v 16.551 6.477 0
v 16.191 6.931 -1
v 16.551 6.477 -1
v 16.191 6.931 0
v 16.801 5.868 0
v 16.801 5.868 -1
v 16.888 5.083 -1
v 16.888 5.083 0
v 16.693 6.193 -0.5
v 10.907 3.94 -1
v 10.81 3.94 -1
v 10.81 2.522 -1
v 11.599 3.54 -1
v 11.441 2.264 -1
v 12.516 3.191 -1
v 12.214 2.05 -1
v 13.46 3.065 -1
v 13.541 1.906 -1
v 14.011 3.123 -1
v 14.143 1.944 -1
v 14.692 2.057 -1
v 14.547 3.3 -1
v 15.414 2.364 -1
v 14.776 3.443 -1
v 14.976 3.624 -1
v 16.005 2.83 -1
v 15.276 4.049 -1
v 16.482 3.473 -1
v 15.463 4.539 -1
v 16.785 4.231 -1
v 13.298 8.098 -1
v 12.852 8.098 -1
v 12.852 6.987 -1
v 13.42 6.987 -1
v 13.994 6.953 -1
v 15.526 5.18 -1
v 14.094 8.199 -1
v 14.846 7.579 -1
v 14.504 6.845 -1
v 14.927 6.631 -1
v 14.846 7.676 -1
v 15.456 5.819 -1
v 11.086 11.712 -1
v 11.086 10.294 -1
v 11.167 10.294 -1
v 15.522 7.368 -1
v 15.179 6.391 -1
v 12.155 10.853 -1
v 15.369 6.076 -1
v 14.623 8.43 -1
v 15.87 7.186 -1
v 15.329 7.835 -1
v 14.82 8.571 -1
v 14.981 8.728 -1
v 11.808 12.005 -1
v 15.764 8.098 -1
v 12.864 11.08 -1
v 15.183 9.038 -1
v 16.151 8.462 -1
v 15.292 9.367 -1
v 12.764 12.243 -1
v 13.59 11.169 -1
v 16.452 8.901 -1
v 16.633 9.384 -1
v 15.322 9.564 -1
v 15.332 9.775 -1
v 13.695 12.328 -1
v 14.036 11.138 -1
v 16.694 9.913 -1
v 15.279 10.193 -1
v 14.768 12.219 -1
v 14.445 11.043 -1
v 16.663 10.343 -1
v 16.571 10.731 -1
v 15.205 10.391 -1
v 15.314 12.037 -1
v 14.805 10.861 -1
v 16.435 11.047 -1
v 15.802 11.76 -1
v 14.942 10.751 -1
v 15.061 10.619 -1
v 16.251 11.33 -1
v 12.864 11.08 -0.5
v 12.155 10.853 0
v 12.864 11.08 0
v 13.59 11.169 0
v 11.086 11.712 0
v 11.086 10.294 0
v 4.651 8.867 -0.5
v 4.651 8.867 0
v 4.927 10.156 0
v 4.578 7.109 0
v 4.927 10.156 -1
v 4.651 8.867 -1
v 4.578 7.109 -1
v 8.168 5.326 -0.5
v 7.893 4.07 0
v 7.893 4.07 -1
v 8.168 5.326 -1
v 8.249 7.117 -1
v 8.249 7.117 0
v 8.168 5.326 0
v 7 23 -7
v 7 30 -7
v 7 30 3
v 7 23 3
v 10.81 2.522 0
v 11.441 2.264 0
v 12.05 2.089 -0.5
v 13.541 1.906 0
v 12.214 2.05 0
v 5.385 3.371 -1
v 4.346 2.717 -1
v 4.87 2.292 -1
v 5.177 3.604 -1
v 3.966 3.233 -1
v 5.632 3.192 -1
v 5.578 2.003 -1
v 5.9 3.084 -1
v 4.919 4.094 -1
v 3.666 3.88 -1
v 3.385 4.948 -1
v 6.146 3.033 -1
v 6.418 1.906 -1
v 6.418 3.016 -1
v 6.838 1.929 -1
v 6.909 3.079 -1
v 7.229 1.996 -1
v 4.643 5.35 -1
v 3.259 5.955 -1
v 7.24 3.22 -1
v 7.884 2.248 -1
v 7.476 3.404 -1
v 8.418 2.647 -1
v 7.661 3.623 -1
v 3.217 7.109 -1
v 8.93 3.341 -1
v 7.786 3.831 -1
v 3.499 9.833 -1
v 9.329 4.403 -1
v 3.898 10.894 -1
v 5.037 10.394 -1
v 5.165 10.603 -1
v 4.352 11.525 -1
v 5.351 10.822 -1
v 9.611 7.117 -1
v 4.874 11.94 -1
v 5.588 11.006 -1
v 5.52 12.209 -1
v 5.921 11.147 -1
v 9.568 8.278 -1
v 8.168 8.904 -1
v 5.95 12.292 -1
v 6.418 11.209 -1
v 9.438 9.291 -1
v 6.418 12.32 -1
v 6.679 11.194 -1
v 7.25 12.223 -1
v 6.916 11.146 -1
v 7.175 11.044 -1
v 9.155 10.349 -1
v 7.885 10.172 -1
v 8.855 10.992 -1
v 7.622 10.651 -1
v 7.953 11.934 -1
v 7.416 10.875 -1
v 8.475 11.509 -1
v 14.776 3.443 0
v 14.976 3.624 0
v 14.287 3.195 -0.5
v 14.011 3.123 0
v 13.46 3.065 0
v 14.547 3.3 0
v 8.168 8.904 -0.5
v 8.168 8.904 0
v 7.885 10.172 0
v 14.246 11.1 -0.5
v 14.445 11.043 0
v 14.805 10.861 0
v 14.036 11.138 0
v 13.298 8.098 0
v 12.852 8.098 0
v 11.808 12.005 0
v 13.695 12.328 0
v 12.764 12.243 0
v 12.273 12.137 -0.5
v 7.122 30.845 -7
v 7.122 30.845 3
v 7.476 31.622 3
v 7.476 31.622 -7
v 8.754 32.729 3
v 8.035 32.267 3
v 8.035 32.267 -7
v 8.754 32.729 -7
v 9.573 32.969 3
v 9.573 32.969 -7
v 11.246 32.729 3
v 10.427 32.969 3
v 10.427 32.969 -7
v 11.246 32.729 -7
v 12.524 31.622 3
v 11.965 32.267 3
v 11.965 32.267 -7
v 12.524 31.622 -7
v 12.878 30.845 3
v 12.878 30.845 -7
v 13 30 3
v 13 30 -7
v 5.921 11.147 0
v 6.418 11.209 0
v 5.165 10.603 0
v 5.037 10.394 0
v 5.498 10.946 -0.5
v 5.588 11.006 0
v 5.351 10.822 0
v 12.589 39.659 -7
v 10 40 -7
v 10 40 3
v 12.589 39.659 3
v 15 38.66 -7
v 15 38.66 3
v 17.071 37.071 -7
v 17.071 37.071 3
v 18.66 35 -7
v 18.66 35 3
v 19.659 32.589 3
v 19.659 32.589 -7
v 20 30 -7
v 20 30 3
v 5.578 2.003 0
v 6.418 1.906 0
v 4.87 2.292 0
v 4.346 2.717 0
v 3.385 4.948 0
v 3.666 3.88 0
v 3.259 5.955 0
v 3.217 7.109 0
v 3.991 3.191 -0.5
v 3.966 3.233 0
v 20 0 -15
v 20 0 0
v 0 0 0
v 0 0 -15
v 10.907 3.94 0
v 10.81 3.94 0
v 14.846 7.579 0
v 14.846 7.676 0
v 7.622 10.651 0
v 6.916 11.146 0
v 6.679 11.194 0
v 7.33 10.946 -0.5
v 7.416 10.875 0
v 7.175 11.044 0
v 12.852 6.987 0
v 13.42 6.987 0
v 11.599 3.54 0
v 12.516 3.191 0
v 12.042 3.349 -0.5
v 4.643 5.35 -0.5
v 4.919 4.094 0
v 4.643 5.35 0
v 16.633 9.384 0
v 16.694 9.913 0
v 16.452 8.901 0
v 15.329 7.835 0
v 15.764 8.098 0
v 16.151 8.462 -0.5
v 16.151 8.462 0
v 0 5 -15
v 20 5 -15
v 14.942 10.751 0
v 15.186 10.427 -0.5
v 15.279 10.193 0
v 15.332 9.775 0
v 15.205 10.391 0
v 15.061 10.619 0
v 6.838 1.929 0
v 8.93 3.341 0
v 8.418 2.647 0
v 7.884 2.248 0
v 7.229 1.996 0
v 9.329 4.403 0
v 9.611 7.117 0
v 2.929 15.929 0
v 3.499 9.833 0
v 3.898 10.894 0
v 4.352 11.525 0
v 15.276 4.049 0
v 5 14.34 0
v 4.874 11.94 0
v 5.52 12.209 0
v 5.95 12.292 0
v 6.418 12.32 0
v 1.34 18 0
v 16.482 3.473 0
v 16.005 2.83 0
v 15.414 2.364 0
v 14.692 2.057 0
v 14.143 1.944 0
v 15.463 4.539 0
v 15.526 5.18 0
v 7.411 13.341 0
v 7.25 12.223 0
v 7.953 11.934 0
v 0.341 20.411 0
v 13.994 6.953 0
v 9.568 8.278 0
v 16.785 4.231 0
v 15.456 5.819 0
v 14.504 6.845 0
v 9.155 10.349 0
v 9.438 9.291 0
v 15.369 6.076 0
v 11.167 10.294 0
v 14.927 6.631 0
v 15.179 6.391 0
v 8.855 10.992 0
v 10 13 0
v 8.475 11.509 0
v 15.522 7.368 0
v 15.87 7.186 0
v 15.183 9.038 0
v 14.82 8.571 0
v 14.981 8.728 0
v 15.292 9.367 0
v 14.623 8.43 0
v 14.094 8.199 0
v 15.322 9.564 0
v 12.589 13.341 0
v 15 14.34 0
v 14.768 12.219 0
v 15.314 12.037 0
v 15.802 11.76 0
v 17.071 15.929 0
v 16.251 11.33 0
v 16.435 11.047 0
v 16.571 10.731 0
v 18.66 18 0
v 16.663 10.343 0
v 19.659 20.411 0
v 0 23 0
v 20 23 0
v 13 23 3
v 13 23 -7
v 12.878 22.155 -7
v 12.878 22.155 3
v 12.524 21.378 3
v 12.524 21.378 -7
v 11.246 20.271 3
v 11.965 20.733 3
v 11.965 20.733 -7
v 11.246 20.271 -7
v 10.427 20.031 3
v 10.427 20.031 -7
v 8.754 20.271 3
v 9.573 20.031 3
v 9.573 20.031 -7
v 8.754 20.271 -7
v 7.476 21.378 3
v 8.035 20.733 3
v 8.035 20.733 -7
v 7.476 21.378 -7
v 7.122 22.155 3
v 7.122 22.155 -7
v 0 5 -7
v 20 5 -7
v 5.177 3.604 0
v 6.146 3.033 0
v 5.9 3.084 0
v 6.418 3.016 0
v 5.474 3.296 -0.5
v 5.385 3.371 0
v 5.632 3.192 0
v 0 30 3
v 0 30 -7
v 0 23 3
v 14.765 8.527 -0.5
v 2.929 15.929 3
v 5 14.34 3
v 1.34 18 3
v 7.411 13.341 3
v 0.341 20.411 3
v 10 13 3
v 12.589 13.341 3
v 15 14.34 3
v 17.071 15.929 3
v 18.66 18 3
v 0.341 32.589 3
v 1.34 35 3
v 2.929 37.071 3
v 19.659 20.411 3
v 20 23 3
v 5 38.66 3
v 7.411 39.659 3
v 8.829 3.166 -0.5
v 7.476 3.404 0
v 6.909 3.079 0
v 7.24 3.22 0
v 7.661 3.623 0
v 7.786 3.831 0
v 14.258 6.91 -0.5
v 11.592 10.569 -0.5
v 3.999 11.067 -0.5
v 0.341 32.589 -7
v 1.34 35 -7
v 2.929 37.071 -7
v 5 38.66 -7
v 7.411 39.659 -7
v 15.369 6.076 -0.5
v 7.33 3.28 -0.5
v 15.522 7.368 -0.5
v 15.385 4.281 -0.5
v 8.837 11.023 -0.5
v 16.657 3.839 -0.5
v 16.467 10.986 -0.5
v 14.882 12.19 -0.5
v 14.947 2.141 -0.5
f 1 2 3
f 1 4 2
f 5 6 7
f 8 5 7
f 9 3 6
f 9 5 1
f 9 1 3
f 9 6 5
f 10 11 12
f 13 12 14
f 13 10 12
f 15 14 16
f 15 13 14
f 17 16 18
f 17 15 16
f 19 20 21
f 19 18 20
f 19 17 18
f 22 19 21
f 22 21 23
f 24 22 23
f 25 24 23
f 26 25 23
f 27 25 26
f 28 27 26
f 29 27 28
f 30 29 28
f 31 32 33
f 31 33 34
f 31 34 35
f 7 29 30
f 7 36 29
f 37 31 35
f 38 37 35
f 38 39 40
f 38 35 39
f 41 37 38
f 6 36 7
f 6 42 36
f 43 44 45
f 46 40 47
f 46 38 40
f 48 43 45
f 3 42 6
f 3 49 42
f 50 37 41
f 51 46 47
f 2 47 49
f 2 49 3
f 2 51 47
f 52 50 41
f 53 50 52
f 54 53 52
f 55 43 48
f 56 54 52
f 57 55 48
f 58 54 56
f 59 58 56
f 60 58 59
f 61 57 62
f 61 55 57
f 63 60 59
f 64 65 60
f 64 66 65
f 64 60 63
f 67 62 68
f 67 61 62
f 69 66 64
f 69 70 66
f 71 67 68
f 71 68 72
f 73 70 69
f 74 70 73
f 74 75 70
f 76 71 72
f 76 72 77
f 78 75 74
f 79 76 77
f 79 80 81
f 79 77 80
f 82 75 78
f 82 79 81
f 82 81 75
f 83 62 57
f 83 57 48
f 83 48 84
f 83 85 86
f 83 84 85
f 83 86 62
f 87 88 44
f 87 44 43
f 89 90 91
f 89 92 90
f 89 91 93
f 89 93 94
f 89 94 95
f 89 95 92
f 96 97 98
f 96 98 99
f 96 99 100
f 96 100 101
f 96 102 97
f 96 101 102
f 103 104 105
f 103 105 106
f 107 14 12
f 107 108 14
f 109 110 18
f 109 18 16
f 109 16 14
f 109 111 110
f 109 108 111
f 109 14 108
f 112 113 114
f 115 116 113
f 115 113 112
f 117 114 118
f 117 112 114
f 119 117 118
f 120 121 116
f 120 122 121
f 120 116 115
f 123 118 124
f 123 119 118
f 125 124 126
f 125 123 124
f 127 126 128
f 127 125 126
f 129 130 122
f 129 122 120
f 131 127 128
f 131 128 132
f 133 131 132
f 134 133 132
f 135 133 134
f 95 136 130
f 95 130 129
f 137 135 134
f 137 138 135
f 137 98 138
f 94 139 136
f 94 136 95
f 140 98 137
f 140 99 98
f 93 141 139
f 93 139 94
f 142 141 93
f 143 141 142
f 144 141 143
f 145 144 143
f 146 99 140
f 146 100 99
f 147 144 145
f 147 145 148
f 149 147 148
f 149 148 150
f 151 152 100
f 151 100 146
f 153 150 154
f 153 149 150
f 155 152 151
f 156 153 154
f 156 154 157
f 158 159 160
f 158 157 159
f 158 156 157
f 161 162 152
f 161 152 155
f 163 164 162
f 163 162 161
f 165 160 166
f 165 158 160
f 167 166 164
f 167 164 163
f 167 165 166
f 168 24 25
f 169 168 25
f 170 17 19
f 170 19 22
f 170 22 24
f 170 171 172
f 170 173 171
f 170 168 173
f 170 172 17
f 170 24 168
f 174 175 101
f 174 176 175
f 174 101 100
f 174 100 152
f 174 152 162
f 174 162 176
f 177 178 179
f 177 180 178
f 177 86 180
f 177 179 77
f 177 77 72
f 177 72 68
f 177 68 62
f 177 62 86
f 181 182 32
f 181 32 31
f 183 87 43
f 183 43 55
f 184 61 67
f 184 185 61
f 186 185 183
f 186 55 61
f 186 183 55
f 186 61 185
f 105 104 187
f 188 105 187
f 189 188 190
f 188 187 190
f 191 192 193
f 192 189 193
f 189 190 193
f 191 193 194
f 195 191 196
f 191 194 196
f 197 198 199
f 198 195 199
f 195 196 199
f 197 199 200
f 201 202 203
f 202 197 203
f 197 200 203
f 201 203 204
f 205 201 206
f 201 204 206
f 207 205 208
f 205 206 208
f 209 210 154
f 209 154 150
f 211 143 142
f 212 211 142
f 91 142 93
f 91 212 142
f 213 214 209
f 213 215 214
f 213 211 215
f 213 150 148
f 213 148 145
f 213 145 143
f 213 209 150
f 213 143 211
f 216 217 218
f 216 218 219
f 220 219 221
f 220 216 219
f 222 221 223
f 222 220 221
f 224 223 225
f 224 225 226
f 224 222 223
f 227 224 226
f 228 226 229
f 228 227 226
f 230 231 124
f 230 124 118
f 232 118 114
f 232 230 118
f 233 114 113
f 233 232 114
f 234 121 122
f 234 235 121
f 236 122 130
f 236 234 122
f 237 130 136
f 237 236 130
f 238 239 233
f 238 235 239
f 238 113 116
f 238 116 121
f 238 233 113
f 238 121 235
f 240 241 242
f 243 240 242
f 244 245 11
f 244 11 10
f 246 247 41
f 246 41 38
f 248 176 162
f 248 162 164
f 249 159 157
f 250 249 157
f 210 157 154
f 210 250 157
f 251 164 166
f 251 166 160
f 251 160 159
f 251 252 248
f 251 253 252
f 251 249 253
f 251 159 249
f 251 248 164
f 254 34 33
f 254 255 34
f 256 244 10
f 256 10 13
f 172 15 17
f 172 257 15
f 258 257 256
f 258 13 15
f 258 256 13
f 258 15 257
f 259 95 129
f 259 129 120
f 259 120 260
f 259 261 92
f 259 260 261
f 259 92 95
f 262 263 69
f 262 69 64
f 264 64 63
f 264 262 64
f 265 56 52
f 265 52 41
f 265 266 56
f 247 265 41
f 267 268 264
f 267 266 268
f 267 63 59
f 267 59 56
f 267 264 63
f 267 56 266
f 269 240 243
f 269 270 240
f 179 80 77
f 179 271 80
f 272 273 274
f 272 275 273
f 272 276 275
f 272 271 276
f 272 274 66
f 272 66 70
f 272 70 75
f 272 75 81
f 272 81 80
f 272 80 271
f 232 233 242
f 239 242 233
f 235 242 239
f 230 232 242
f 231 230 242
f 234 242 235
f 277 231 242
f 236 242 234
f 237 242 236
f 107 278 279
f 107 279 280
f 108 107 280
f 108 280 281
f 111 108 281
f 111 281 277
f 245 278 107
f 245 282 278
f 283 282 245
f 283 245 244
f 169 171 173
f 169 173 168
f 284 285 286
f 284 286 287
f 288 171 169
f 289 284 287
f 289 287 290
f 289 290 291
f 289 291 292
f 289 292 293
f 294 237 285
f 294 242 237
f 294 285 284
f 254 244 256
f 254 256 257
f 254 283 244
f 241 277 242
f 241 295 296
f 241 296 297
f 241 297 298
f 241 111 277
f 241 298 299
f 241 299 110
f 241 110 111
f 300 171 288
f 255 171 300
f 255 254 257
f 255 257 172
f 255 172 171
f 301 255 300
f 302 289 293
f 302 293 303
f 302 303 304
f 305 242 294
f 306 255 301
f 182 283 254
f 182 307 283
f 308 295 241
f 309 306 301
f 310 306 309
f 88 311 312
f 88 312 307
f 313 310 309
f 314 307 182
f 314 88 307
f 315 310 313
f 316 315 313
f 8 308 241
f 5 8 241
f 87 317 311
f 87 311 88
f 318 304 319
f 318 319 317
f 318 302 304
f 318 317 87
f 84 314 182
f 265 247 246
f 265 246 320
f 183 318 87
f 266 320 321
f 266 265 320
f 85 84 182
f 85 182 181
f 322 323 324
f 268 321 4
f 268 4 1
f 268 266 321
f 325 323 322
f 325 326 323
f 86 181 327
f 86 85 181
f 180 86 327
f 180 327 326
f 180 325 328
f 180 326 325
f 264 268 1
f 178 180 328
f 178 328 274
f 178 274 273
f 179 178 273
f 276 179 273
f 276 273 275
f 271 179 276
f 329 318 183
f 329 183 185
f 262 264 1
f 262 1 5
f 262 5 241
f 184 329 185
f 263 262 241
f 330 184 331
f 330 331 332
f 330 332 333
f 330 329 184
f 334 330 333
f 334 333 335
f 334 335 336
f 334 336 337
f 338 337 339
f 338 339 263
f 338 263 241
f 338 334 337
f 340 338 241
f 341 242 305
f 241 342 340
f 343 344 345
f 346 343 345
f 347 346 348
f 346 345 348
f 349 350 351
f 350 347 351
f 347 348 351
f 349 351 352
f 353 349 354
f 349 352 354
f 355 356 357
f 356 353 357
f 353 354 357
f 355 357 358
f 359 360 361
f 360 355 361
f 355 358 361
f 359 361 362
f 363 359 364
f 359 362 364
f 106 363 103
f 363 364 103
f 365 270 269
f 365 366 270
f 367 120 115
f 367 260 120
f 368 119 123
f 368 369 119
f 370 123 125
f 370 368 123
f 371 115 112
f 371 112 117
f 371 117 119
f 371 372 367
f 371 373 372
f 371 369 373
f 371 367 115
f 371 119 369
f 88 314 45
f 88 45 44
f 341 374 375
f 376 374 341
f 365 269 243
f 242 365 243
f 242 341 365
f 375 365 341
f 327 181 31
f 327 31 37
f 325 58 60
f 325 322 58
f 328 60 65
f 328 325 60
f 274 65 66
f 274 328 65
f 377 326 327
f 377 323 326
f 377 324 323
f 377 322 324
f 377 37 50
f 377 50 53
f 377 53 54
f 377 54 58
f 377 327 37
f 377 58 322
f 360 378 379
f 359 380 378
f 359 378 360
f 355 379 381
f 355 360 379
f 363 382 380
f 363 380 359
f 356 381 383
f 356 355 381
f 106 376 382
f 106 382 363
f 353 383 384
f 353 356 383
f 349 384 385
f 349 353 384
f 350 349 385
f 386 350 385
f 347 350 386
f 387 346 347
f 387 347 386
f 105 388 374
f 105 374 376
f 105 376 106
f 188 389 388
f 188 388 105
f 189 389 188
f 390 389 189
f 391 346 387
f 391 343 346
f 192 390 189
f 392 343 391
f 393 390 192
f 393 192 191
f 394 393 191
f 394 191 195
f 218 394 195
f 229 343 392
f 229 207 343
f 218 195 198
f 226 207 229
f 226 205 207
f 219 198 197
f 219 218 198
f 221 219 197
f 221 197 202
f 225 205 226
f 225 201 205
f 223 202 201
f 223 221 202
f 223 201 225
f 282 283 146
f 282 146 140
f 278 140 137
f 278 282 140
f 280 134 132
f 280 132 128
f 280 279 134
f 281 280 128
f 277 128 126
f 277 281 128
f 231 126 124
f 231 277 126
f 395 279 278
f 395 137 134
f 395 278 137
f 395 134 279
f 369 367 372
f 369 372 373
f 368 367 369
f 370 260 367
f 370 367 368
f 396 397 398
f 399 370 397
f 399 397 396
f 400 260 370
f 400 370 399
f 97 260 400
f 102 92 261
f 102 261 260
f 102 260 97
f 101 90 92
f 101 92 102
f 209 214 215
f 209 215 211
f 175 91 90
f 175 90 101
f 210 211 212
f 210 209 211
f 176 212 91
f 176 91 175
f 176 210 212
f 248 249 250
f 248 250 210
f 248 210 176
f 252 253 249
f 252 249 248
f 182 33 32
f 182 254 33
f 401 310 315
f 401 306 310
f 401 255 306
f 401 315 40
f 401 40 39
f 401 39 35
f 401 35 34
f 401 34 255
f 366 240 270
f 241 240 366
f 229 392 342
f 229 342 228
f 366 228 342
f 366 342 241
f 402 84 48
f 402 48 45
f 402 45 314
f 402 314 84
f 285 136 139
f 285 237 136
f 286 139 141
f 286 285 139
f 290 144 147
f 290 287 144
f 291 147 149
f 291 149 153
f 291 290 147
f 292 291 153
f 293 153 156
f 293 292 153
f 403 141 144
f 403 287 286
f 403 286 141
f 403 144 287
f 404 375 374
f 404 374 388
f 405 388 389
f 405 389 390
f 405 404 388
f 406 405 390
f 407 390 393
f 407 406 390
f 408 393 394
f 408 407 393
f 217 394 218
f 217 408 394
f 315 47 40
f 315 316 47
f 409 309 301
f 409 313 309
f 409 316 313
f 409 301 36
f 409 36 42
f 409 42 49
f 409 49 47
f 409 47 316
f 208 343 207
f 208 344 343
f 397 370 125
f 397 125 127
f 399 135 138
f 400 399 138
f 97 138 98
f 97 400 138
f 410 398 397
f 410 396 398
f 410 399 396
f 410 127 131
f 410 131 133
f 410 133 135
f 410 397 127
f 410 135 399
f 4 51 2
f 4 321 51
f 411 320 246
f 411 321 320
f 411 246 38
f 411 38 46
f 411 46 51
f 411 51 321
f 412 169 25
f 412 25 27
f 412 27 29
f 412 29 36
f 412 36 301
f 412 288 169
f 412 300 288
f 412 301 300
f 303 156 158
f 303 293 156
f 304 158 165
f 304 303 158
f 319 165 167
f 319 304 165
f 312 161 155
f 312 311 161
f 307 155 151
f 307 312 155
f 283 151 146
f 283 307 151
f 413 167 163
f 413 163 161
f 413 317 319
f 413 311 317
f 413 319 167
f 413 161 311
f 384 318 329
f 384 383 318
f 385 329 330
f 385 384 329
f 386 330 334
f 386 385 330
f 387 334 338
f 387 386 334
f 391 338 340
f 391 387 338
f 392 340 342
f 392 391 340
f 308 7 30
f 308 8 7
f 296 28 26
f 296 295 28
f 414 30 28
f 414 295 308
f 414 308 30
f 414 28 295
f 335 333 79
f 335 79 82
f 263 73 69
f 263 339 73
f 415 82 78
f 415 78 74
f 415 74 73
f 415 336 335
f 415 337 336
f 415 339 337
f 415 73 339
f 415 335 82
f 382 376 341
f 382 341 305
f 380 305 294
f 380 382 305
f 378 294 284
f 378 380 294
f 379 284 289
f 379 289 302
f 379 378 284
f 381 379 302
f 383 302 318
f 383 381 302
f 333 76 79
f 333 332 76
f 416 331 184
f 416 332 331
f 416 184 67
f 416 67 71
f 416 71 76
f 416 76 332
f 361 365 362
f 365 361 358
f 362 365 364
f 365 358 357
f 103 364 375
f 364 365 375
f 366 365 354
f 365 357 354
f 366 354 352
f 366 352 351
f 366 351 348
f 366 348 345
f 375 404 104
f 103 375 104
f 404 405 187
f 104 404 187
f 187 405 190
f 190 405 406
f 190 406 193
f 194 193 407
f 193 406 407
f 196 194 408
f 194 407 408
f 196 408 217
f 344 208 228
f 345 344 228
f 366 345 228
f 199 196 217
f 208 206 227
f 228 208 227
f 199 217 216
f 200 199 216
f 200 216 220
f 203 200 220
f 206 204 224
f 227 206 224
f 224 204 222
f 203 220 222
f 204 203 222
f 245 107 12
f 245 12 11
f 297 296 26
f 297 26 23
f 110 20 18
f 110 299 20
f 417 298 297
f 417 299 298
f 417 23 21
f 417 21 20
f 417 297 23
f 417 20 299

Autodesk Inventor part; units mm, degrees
ref_plane "YZ Plane" through (0, 0, 0) normal (1, 0, 0) x (0, 1, 0)
ref_plane "XZ Plane" through (0, 0, 0) normal (0, 1, 0) x (-1, 0, 0)
ref_plane "XY Plane" through (0, 0, 0) normal (0, 0, 1) x (1, 0, 0)
sketch "스케치1" plane through (0, 0, 0) normal (0, 0, 1) x (1, 0, 0)
  line L0 (0, 0) -> (20, 0)
  line L1 (20, 0) -> (20, 40)
  line L2 (20, 40) -> (0, 40)
  line L3 (0, 40) -> (0, 0)
  line L4 (0, 13) -> (20, 13)
  line L5 (10, 30) -> (10, 23) construction
  line L6 (7, 30) -> (7, 23)
  line L7 (13, 23) -> (13, 30)
  arc A0 (13, 30) -> (7, 30) centre (10, 30) ccw
  arc A1 (7, 23) -> (13, 23) centre (10, 23) ccw
  point P0 (10, 26.5)
  dimension "d0" = 20
  dimension "d1" = 40
  dimension "d2" = 27
  dimension "d4" = 7
  dimension "d5" = 13.5
  dimension "d6" = 10
  dimension "d7" = 3
extrude "돌출1" add sketch "스케치1" against normal blind 7
extrude "돌출2" add sketch "스케치1" along normal blind 3 contours L3 L2 L1 L4
fillet "모깎기1" radius 10 4 edges at (20, 40, -2) (0, 40, -2) (20, 13, 1.5) (0, 13, 1.5)
sketch "스케치2" plane through (0, 0, -7) normal (0, 0, -1) x (-1, 0, 0)
  line L0 (-20, 0) -> (-20, 23) projected
  line L1 (-20, 0) -> (0, 0) projected
  line L2 (-20, 0) -> (-20, 30) projected
  arc A0 (0, 30) -> (-20, 30) centre (-10, 30) ccw projected
  line L3 (0, 30) -> (0, 0) projected
  line L4 (0, 0) -> (-20, 0) projected
  line L5 (-13, 30) -> (-13, 23) projected
  arc A1 (-13, 23) -> (-7, 23) centre (-10, 23) ccw projected
  line L6 (-7, 23) -> (-7, 30) projected
  arc A2 (-7, 30) -> (-13, 30) centre (-10, 30) ccw projected
  line L7 (-20, 5) -> (0, 5)
  dimension "d14" = 5
extrude "돌출3" add sketch "스케치2" along normal blind 8 contours L0 L7 L3 L1
sketch "스케치3" plane through (0, 0, 0) normal (0, 0, 1) x (1, 0, 0)
  line L0 (2.6578, 12.3276) -> (17.6998, 12.3276) construction
  line L1 (17.6998, 12.3276) -> (17.6998, 1.5834) construction
  line L2 (17.6998, 1.5834) -> (2.6578, 1.5834) construction
  line L3 (2.6578, 1.5834) -> (2.6578, 12.3276) construction
  spline S0 degree 2 poles (9.6108, 7.1169) (9.6108, 4.4265) (8.0468, 1.9062) (6.4179, 1.9062) knots 0 0 0 1 2 2 2
  spline S1 degree 2 poles (6.4179, 1.9062) (4.7648, 1.9062) (3.217, 4.4751) (3.217, 7.1088) knots 0 0 0 1 2 2 2
  spline S2 degree 2 poles (3.217, 7.1088) (3.217, 9.8155) (4.781, 12.3195) (6.4179, 12.3195) knots 0 0 0 1 2 2 2
  spline S3 degree 2 poles (6.4179, 12.3195) (8.063, 12.3195) (9.6108, 9.7263) (9.6108, 7.1169) knots 0 0 0 1 2 2 2
  spline S4 degree 2 poles (7.8928, 4.0699) (8.0873, 4.5643) (8.2494, 6.0878) (8.2494, 7.1169) knots 0 0 0 1 2 2 2
  spline S5 degree 2 poles (8.2494, 7.1169) (8.2494, 8.1461) (8.0873, 9.6615) (7.8847, 10.1721) knots 0 0 0 1 2 2 2
  spline S6 degree 2 poles (7.8847, 10.1721) (7.6821, 10.6826) (6.9771, 11.2093) (6.4179, 11.2093) knots 0 0 0 1 2 2 2
  spline S7 degree 2 poles (6.4179, 11.2093) (5.8588, 11.2093) (5.1375, 10.6826) (4.9268, 10.1558) knots 0 0 0 1 2 2 2
  spline S8 degree 2 poles (4.9268, 10.1558) (4.7242, 9.6453) (4.5784, 8.0894) (4.5784, 7.1088) knots 0 0 0 1 2 2 2
  spline S9 degree 2 poles (4.5784, 7.1088) (4.5784, 6.0554) (4.708, 4.6453) (4.9187, 4.0943) knots 0 0 0 1 2 2 2
  spline S10 degree 2 poles (4.9187, 4.0943) (5.1132, 3.5756) (5.8345, 3.0165) (6.4179, 3.0165) knots 0 0 0 1 2 2 2
  spline S11 degree 2 poles (6.4179, 3.0165) (6.969, 3.0165) (7.6902, 3.5432) (7.8928, 4.0699) knots 0 0 0 1 2 2 2
  spline S12 degree 2 poles (13.5897, 11.1688) (13.2251, 11.1688) (12.5038, 10.9905) (12.1554, 10.8528) knots 0 0 0 1 2 2 2
  spline S13 degree 2 poles (12.1554, 10.8528) (11.8312, 10.715) (11.3531, 10.4233) (11.1667, 10.2936) knots 0 0 0 1 2 2 2
  line L4 (11.1667, 10.2936) -> (11.0857, 10.2936)
  line L5 (11.0857, 10.2936) -> (11.0857, 11.7118)
  spline S14 degree 2 poles (11.0857, 11.7118) (11.5233, 11.9468) (13.0225, 12.3276) (13.6951, 12.3276) knots 0 0 0 1 2 2 2
  spline S15 degree 2 poles (13.6951, 12.3276) (14.3758, 12.3276) (15.3888, 12.0521) (15.802, 11.7604) knots 0 0 0 1 2 2 2
  spline S16 degree 2 poles (15.802, 11.7604) (16.2396, 11.4443) (16.6935, 10.5286) (16.6935, 9.9127) knots 0 0 0 1 2 2 2
  spline S17 degree 2 poles (16.6935, 9.9127) (16.6935, 9.0862) (15.6076, 7.8382) (14.8458, 7.6761) knots 0 0 0 1 2 2 2
  line L6 (14.8458, 7.6761) -> (14.8458, 7.5789)
  spline S18 degree 2 poles (14.8458, 7.5789) (15.1618, 7.514) (15.8831, 7.2223) (16.191, 6.9306) knots 0 0 0 1 2 2 2
  spline S19 degree 2 poles (16.191, 6.9306) (16.499, 6.6469) (16.8879, 5.7393) (16.8879, 5.0829) knots 0 0 0 1 2 2 2
  spline S20 degree 2 poles (16.8879, 5.0829) (16.8879, 4.4103) (16.426, 3.2677) (16.0046, 2.8301) knots 0 0 0 1 2 2 2
  spline S21 degree 2 poles (16.0046, 2.8301) (15.567, 2.3763) (14.3272, 1.9062) (13.5411, 1.9062) knots 0 0 0 1 2 2 2
  spline S22 degree 2 poles (13.5411, 1.9062) (12.7875, 1.9062) (11.3126, 2.2709) (10.8101, 2.5221) knots 0 0 0 1 2 2 2
  line L7 (10.8101, 2.5221) -> (10.8101, 3.9403)
  line L8 (10.8101, 3.9403) -> (10.9074, 3.9403)
  spline S23 degree 2 poles (10.9074, 3.9403) (11.3288, 3.6323) (12.755, 3.0651) (13.4601, 3.0651) knots 0 0 0 1 2 2 2
  spline S24 degree 2 poles (13.4601, 3.0651) (13.8734, 3.0651) (14.6999, 3.3244) (14.9755, 3.6242) knots 0 0 0 1 2 2 2
  spline S25 degree 2 poles (14.9755, 3.6242) (15.2429, 3.9241) (15.5265, 4.6372) (15.5265, 5.1802) knots 0 0 0 1 2 2 2
  spline S26 degree 2 poles (15.5265, 5.1802) (15.5265, 5.7231) (15.2105, 6.4281) (14.9268, 6.6307) knots 0 0 0 1 2 2 2
  spline S27 degree 2 poles (14.9268, 6.6307) (14.6432, 6.8333) (13.8734, 6.9873) (13.4195, 6.9873) knots 0 0 0 1 2 2 2
  line L9 (13.4195, 6.9873) -> (12.8523, 6.9873)
  line L10 (12.8523, 6.9873) -> (12.8523, 8.0975)
  line L11 (12.8523, 8.0975) -> (13.298, 8.0975)
  spline S28 degree 2 poles (13.298, 8.0975) (14.1975, 8.0975) (15.332, 8.9565) (15.332, 9.775) knots 0 0 0 1 2 2 2
  spline S29 degree 2 poles (15.332, 9.775) (15.332, 10.1558) (15.0403, 10.6988) (14.8053, 10.8609) knots 0 0 0 1 2 2 2
  spline S30 degree 2 poles (14.8053, 10.8609) (14.5541, 11.031) (13.9382, 11.1688) (13.5897, 11.1688) knots 0 0 0 1 2 2 2
  point P0 (0, 0)
extrude "돌출4" cut sketch "스케치3" against normal blind 1
properties part number "1번부품"
